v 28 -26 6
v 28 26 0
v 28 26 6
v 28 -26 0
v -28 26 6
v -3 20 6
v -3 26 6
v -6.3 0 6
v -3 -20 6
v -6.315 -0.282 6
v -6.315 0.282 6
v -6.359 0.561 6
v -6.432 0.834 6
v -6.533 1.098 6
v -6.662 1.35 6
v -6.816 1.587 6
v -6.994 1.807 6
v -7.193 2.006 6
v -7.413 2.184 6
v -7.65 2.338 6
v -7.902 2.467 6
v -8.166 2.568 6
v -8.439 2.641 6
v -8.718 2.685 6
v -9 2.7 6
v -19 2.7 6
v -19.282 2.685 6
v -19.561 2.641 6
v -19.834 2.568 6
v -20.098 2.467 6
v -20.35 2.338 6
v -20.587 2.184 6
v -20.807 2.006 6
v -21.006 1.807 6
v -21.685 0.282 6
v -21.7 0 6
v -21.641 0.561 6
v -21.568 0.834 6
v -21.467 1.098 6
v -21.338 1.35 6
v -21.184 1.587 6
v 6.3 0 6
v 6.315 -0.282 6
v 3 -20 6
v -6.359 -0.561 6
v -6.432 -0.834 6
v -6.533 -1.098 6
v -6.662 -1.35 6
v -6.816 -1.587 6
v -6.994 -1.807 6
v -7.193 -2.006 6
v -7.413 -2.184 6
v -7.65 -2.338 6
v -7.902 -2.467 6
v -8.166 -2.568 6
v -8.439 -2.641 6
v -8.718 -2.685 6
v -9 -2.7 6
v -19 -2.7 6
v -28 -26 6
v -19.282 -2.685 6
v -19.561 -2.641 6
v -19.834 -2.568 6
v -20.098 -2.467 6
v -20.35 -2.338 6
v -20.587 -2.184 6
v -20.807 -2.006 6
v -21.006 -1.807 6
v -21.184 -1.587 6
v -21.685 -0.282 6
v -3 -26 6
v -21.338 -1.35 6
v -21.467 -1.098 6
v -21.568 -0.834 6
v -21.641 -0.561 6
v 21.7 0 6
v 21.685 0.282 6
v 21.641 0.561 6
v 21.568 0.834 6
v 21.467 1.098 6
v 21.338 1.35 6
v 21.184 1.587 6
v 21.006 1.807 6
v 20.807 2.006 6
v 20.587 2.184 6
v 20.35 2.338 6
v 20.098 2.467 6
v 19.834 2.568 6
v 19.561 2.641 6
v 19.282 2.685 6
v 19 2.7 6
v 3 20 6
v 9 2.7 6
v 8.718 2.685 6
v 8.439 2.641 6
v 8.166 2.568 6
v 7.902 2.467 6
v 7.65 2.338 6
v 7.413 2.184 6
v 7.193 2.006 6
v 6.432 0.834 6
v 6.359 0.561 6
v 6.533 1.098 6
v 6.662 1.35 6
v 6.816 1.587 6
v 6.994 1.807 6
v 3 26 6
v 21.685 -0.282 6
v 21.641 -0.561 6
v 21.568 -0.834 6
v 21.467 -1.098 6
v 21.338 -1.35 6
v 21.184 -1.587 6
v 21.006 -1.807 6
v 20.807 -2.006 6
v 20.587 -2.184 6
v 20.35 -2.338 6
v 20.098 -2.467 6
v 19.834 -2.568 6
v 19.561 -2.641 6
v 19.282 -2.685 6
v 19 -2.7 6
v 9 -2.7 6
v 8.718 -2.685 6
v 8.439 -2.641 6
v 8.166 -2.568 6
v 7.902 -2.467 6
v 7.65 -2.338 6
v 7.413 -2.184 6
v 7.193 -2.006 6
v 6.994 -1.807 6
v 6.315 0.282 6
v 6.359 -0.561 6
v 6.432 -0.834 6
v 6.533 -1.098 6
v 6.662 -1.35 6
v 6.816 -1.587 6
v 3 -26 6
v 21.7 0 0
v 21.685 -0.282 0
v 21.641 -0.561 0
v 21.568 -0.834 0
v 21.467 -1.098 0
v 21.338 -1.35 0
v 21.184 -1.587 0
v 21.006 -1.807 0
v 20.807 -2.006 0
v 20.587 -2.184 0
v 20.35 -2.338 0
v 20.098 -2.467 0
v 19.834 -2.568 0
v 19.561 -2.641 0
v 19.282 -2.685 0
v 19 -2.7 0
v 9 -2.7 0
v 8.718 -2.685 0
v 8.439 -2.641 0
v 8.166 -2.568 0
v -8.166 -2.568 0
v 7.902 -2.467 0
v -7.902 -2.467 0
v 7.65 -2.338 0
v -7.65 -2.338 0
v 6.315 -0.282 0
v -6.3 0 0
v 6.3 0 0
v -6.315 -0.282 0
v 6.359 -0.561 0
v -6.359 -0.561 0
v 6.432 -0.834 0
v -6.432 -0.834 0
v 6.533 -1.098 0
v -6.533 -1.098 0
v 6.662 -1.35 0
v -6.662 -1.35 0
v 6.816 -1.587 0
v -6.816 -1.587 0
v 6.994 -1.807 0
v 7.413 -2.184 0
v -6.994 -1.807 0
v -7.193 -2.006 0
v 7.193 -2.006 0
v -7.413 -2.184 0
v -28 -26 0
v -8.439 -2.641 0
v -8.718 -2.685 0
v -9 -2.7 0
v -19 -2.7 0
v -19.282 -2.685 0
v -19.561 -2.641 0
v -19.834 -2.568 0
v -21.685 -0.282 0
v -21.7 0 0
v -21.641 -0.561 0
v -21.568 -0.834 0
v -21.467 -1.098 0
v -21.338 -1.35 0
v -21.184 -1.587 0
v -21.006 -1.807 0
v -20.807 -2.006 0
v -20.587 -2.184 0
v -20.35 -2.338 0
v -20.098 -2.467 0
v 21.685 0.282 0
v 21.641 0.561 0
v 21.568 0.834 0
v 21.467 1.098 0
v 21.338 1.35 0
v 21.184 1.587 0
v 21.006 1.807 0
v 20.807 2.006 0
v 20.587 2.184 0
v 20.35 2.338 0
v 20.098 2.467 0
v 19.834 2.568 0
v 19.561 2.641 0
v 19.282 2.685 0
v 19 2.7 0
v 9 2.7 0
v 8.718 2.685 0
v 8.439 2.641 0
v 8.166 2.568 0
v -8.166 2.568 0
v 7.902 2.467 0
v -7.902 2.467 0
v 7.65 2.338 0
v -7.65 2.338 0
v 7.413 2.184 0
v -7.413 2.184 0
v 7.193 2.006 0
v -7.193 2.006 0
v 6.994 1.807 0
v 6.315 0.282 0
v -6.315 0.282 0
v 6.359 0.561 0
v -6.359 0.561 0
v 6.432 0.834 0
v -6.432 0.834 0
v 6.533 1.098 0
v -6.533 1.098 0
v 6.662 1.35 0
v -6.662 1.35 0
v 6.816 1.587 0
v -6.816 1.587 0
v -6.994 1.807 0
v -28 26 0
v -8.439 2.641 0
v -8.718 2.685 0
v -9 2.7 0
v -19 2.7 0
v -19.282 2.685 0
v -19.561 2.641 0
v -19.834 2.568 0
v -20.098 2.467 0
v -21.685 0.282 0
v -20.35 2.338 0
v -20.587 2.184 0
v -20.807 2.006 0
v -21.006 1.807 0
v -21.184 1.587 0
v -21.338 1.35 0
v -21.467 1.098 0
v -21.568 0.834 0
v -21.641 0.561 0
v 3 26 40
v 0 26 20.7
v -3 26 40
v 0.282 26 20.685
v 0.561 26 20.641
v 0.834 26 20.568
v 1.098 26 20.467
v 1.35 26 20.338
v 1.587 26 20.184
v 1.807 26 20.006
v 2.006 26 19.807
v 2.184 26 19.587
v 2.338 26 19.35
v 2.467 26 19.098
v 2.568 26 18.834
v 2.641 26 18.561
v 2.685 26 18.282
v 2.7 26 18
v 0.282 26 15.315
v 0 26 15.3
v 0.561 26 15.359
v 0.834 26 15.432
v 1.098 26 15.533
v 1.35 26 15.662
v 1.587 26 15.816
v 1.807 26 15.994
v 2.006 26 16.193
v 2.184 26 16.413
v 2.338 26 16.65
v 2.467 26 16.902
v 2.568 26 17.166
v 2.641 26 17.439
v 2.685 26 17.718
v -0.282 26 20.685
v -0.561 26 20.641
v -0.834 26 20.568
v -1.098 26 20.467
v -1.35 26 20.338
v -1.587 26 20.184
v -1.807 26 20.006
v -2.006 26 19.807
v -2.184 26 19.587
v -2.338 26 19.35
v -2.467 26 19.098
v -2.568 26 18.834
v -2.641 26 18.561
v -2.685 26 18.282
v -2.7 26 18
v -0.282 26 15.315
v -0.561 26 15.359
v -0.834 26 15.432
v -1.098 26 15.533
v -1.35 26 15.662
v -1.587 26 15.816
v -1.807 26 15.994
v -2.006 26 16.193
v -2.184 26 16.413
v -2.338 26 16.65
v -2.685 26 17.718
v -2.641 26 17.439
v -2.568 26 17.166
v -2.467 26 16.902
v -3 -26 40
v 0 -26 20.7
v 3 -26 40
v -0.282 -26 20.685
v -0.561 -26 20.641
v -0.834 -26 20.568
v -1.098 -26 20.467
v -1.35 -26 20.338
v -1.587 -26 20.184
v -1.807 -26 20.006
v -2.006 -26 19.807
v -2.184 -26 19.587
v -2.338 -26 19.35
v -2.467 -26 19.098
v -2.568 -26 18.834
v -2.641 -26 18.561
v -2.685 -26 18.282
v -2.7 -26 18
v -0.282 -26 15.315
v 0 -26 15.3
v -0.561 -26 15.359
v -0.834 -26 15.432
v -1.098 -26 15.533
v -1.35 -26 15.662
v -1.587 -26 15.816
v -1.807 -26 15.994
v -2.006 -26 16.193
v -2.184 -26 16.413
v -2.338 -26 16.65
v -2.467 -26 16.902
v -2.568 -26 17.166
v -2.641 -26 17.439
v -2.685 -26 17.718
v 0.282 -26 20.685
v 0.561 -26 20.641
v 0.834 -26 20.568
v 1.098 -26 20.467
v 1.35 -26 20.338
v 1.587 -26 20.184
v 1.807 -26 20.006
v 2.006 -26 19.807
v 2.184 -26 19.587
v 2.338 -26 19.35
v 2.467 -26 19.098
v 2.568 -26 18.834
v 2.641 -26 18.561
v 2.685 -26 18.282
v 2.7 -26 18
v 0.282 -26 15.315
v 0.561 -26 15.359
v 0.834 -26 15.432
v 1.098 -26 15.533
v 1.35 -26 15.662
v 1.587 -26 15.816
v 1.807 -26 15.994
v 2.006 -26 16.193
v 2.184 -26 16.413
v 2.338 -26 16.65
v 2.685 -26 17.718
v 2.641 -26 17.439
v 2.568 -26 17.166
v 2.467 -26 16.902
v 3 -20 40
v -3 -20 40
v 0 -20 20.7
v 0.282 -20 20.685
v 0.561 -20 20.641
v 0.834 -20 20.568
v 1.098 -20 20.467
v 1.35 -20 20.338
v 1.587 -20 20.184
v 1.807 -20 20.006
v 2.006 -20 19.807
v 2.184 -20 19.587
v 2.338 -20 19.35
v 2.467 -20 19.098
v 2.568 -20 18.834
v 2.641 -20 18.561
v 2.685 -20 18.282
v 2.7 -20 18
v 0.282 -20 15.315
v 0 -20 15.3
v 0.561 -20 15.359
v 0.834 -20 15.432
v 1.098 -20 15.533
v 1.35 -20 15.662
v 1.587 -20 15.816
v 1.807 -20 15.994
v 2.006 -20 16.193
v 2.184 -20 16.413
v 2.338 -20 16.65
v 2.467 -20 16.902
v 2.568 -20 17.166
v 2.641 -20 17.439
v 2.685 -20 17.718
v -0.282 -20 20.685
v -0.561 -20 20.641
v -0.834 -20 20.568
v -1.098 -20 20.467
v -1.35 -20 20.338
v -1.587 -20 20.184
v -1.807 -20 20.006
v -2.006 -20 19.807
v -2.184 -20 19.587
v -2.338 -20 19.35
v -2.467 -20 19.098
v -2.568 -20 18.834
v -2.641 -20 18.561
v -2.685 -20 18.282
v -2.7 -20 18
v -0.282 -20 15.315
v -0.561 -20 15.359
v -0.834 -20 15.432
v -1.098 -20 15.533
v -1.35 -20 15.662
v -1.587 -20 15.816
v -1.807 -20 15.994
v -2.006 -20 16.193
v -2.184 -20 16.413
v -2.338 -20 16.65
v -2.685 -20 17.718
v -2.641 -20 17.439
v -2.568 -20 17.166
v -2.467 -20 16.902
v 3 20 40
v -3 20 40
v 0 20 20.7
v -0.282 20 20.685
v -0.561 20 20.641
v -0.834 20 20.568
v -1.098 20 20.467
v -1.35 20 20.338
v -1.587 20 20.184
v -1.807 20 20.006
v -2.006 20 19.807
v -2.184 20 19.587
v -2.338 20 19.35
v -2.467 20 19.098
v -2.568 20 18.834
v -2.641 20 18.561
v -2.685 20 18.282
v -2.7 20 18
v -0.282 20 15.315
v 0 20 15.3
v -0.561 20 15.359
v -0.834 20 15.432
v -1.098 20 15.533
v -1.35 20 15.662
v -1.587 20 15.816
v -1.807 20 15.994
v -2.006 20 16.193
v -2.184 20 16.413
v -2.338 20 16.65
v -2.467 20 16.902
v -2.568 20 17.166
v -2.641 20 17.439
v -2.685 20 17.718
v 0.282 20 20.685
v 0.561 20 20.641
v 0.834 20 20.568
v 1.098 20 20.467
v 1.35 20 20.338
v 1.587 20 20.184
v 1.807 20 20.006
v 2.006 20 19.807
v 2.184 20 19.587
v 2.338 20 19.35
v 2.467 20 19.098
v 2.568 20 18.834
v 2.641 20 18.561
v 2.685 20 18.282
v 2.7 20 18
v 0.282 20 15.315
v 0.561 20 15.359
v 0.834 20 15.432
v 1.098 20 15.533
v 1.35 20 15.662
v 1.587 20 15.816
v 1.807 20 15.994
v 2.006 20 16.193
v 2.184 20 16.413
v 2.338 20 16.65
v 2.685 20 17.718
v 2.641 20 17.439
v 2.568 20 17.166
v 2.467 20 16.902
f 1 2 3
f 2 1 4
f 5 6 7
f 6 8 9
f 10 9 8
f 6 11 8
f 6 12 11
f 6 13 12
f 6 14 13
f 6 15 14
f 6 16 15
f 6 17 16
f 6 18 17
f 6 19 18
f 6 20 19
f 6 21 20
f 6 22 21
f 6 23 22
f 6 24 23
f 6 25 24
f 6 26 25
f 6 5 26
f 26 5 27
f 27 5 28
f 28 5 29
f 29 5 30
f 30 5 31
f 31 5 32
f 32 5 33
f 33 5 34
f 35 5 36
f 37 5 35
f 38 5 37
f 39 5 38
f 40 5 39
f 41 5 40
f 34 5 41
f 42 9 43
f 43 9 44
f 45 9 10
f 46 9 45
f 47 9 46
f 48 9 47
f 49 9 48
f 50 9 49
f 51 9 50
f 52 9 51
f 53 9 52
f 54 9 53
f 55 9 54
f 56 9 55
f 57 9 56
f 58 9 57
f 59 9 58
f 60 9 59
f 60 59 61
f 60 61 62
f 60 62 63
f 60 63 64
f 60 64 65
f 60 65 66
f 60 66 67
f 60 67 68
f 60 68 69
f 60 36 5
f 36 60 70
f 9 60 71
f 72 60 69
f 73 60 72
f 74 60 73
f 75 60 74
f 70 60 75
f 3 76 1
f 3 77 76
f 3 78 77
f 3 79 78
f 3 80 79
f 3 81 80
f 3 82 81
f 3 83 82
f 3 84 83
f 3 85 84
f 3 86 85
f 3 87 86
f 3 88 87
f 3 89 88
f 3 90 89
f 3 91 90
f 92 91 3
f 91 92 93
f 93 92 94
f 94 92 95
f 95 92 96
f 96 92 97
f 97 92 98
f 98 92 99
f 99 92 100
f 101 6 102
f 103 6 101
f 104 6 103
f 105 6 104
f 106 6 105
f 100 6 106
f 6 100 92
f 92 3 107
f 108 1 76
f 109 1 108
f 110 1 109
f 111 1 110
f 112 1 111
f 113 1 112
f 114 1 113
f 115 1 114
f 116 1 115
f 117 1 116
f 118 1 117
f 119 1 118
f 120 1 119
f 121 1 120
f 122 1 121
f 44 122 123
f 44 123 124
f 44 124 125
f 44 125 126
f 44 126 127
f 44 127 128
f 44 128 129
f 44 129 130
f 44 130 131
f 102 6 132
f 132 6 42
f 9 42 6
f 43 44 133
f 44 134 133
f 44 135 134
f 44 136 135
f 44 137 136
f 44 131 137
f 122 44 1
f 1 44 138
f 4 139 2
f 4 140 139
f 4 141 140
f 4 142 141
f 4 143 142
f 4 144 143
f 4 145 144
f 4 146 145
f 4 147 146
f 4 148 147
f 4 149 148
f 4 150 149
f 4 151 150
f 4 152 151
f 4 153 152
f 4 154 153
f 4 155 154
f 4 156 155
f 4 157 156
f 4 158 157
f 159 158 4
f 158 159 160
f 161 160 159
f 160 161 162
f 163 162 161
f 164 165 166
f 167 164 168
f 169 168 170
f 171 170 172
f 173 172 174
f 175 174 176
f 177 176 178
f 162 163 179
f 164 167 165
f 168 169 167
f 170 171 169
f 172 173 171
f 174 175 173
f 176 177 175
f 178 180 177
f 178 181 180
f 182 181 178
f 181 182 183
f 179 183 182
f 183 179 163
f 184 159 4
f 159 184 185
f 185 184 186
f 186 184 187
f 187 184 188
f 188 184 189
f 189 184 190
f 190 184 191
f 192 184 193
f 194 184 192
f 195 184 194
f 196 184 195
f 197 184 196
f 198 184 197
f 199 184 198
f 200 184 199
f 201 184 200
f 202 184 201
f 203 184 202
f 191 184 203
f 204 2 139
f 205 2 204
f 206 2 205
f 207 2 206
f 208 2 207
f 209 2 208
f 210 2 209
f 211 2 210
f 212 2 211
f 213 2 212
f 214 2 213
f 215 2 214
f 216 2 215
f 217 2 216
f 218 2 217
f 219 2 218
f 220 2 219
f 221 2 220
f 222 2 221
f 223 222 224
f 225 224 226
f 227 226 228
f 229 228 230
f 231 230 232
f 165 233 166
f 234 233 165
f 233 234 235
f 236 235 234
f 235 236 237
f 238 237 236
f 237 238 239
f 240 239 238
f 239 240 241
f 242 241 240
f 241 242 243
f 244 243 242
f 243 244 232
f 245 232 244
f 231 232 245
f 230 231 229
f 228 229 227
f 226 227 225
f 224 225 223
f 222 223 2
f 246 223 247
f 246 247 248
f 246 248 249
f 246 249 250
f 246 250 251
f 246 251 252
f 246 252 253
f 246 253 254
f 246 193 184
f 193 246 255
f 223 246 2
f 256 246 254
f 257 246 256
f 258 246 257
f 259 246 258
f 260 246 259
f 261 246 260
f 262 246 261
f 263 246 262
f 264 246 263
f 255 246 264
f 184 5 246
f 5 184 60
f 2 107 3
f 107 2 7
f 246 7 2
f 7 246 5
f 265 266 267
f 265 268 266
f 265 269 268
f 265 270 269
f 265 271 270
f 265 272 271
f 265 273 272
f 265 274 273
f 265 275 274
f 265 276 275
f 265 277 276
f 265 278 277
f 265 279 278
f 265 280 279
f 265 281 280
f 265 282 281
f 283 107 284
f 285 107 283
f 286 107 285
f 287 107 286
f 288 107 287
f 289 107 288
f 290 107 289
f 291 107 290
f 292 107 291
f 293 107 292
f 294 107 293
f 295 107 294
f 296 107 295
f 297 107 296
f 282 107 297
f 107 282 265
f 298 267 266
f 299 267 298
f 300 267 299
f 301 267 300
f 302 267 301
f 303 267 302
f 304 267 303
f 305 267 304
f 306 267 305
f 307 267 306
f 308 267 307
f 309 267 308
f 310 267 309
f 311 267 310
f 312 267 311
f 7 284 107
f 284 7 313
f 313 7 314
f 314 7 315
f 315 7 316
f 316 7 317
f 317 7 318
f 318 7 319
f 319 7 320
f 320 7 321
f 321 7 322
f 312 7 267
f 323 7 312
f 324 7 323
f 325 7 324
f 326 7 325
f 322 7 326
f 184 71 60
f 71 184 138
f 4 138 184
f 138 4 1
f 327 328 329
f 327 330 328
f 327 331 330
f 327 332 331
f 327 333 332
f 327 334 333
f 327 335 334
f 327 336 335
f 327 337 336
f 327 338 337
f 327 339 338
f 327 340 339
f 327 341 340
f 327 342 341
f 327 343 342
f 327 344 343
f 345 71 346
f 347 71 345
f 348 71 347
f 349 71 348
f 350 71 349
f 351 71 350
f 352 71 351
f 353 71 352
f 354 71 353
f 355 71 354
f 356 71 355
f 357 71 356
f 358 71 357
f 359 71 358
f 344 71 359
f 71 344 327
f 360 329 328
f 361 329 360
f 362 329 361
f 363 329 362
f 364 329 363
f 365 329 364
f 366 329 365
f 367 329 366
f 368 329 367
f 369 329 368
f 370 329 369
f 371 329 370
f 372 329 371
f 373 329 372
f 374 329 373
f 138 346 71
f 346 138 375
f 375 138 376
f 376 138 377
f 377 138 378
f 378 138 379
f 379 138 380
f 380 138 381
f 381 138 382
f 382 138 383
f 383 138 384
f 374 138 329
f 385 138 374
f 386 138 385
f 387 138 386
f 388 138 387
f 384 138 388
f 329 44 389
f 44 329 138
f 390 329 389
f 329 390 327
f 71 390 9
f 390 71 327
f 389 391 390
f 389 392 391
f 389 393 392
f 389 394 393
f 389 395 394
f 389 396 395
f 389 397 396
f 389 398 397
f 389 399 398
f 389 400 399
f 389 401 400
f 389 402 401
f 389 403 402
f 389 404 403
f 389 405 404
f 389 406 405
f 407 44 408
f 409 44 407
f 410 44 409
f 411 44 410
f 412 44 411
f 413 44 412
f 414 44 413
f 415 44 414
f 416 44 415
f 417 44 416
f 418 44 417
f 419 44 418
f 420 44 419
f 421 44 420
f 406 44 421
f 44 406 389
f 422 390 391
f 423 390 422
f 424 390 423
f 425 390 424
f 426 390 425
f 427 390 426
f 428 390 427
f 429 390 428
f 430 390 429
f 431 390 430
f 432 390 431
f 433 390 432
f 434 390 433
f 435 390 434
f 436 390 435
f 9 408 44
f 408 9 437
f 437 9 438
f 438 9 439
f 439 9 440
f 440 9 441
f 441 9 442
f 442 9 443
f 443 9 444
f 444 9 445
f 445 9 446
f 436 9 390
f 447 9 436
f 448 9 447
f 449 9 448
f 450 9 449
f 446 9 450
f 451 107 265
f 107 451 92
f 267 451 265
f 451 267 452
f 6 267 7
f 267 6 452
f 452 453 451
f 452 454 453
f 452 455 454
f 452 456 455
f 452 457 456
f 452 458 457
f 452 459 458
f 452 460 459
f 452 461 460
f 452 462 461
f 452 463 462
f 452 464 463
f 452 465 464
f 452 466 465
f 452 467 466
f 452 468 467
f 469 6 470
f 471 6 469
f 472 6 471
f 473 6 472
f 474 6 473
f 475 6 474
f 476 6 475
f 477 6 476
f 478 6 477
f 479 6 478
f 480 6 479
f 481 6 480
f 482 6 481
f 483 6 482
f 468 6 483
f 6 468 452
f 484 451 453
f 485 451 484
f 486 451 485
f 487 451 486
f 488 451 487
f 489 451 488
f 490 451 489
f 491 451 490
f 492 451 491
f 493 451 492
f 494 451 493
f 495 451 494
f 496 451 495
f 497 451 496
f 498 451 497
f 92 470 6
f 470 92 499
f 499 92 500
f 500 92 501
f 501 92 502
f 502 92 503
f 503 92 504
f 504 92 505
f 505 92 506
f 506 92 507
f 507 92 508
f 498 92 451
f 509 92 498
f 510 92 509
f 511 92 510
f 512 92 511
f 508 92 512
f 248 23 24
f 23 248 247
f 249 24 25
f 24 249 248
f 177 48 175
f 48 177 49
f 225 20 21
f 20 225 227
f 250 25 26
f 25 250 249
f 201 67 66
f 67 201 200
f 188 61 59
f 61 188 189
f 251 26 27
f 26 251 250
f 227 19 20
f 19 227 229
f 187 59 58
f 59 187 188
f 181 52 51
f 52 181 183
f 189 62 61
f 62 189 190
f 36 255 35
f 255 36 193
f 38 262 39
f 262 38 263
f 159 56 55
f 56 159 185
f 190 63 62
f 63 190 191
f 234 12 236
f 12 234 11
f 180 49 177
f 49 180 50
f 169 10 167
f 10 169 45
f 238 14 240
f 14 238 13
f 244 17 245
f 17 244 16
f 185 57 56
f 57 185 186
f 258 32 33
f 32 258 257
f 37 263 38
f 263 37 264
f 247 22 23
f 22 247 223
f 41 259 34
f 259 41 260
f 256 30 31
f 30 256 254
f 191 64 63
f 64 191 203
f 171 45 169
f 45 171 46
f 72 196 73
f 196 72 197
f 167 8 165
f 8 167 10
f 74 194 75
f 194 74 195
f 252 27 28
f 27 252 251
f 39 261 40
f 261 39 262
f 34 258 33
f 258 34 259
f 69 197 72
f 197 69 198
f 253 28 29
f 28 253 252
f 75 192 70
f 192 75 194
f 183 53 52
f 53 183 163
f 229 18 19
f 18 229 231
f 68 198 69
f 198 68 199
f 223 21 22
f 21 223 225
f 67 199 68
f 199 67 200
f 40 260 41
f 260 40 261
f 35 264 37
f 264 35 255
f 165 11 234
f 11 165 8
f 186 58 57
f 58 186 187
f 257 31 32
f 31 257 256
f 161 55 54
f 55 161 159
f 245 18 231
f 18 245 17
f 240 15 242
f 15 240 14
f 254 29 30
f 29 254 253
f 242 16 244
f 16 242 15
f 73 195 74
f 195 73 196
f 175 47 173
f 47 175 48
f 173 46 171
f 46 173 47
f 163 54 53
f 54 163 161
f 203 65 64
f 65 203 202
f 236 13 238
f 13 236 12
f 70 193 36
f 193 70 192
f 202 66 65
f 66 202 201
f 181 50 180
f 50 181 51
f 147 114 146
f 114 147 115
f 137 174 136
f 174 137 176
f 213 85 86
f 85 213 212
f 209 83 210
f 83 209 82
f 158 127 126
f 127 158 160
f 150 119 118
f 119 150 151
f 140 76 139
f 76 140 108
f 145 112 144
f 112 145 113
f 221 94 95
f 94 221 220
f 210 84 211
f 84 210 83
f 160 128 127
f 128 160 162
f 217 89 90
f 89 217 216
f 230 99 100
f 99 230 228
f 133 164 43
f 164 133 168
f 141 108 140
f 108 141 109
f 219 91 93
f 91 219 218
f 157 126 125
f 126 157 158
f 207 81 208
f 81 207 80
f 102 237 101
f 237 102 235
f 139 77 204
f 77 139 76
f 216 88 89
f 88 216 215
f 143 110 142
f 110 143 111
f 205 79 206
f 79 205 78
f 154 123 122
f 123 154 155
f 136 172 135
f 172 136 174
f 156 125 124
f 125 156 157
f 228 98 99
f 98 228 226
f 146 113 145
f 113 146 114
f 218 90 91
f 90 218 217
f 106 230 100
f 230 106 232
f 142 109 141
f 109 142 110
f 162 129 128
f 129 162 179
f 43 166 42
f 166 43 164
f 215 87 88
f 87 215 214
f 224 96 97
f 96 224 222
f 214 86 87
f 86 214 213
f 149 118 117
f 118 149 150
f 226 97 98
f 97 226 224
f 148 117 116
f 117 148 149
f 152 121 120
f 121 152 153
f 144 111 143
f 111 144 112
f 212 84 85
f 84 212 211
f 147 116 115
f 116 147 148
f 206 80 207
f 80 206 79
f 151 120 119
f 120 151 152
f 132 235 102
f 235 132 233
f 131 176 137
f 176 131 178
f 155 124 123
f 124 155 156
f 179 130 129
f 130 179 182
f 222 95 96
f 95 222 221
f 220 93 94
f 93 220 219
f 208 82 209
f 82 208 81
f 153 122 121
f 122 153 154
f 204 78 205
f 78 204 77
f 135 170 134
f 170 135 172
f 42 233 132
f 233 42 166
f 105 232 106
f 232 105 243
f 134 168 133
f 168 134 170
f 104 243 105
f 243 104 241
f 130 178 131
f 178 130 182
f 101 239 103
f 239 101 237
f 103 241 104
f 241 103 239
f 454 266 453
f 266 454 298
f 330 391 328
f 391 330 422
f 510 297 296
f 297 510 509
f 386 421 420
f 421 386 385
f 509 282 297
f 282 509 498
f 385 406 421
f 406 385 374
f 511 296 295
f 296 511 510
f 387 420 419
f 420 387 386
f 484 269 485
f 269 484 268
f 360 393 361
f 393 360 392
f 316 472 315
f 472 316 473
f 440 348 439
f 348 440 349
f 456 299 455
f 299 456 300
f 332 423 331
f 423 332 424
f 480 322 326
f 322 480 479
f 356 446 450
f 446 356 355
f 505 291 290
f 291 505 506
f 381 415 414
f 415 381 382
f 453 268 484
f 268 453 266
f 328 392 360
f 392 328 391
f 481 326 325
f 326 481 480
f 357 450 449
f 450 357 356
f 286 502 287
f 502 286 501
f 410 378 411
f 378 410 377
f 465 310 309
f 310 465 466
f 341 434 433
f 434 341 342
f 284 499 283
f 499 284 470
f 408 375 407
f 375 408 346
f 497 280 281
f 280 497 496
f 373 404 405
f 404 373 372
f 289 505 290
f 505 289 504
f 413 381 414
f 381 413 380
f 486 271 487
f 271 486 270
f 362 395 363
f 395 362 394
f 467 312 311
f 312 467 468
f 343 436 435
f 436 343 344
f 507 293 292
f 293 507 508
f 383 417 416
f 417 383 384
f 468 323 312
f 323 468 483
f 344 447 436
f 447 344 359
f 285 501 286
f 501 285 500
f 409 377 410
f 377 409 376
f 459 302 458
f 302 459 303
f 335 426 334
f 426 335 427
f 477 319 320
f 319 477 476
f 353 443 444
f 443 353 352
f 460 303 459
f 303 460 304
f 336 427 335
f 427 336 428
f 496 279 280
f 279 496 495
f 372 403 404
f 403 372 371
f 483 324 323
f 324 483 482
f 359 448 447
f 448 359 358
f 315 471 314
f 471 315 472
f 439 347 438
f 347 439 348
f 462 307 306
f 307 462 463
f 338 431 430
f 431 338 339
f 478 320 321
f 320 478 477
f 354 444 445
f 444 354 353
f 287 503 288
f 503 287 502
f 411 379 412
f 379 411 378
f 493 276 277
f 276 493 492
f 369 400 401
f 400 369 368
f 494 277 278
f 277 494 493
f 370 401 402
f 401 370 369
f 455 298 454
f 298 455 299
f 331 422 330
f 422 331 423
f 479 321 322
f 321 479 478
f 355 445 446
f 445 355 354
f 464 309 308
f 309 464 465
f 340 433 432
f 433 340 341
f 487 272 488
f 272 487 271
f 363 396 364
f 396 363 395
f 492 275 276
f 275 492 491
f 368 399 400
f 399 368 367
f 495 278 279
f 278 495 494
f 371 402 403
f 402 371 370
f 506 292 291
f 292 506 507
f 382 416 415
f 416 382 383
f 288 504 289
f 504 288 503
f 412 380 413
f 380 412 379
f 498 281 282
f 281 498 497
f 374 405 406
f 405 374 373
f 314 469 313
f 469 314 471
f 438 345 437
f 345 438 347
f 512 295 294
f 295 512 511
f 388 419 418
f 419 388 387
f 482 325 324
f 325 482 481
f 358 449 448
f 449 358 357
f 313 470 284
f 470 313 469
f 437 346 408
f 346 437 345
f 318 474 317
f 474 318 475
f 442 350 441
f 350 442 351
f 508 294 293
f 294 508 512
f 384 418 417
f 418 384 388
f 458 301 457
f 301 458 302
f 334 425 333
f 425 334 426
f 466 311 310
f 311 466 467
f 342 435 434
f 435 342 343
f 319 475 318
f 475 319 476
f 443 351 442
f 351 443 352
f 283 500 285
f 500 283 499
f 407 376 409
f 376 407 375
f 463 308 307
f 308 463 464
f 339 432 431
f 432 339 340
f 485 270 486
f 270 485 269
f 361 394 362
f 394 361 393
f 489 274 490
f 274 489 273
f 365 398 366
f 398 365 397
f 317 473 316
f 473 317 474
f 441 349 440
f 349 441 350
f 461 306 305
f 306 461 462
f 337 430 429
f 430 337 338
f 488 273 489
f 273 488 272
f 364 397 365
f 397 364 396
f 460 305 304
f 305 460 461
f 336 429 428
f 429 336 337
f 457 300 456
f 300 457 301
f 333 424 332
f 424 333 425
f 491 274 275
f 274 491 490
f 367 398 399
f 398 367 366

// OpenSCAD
// U pivot bracket, 40 mm opening.
$fn = 60;
eps = 0.02;
base_l = 56;
base_w = 52;
base_t = 6;
ear_t = 6;
ear_h = 36;
pivot_d = 5.4;
module mount(x) {
    hull() {
        translate([x - 5, 0, -eps]) cylinder(d = 5.4, h = base_t + 2 * eps);
        translate([x + 5, 0, -eps]) cylinder(d = 5.4, h = base_t + 2 * eps);
    }
}
difference() {
    union() {
        translate([-base_l / 2, -base_w / 2, 0]) cube([base_l, base_w, base_t]);
        translate([-ear_t / 2, -base_w / 2, base_t - 2]) cube([ear_t, ear_t, ear_h]);
        translate([-ear_t / 2, base_w / 2 - ear_t, base_t - 2]) cube([ear_t, ear_t, ear_h]);
    }
    mount(-14); mount(14);
    translate([0, -base_w / 2 - eps, ear_h / 2]) rotate([-90, 0, 0]) cylinder(d = pivot_d, h = base_w + 2 * eps);
}
